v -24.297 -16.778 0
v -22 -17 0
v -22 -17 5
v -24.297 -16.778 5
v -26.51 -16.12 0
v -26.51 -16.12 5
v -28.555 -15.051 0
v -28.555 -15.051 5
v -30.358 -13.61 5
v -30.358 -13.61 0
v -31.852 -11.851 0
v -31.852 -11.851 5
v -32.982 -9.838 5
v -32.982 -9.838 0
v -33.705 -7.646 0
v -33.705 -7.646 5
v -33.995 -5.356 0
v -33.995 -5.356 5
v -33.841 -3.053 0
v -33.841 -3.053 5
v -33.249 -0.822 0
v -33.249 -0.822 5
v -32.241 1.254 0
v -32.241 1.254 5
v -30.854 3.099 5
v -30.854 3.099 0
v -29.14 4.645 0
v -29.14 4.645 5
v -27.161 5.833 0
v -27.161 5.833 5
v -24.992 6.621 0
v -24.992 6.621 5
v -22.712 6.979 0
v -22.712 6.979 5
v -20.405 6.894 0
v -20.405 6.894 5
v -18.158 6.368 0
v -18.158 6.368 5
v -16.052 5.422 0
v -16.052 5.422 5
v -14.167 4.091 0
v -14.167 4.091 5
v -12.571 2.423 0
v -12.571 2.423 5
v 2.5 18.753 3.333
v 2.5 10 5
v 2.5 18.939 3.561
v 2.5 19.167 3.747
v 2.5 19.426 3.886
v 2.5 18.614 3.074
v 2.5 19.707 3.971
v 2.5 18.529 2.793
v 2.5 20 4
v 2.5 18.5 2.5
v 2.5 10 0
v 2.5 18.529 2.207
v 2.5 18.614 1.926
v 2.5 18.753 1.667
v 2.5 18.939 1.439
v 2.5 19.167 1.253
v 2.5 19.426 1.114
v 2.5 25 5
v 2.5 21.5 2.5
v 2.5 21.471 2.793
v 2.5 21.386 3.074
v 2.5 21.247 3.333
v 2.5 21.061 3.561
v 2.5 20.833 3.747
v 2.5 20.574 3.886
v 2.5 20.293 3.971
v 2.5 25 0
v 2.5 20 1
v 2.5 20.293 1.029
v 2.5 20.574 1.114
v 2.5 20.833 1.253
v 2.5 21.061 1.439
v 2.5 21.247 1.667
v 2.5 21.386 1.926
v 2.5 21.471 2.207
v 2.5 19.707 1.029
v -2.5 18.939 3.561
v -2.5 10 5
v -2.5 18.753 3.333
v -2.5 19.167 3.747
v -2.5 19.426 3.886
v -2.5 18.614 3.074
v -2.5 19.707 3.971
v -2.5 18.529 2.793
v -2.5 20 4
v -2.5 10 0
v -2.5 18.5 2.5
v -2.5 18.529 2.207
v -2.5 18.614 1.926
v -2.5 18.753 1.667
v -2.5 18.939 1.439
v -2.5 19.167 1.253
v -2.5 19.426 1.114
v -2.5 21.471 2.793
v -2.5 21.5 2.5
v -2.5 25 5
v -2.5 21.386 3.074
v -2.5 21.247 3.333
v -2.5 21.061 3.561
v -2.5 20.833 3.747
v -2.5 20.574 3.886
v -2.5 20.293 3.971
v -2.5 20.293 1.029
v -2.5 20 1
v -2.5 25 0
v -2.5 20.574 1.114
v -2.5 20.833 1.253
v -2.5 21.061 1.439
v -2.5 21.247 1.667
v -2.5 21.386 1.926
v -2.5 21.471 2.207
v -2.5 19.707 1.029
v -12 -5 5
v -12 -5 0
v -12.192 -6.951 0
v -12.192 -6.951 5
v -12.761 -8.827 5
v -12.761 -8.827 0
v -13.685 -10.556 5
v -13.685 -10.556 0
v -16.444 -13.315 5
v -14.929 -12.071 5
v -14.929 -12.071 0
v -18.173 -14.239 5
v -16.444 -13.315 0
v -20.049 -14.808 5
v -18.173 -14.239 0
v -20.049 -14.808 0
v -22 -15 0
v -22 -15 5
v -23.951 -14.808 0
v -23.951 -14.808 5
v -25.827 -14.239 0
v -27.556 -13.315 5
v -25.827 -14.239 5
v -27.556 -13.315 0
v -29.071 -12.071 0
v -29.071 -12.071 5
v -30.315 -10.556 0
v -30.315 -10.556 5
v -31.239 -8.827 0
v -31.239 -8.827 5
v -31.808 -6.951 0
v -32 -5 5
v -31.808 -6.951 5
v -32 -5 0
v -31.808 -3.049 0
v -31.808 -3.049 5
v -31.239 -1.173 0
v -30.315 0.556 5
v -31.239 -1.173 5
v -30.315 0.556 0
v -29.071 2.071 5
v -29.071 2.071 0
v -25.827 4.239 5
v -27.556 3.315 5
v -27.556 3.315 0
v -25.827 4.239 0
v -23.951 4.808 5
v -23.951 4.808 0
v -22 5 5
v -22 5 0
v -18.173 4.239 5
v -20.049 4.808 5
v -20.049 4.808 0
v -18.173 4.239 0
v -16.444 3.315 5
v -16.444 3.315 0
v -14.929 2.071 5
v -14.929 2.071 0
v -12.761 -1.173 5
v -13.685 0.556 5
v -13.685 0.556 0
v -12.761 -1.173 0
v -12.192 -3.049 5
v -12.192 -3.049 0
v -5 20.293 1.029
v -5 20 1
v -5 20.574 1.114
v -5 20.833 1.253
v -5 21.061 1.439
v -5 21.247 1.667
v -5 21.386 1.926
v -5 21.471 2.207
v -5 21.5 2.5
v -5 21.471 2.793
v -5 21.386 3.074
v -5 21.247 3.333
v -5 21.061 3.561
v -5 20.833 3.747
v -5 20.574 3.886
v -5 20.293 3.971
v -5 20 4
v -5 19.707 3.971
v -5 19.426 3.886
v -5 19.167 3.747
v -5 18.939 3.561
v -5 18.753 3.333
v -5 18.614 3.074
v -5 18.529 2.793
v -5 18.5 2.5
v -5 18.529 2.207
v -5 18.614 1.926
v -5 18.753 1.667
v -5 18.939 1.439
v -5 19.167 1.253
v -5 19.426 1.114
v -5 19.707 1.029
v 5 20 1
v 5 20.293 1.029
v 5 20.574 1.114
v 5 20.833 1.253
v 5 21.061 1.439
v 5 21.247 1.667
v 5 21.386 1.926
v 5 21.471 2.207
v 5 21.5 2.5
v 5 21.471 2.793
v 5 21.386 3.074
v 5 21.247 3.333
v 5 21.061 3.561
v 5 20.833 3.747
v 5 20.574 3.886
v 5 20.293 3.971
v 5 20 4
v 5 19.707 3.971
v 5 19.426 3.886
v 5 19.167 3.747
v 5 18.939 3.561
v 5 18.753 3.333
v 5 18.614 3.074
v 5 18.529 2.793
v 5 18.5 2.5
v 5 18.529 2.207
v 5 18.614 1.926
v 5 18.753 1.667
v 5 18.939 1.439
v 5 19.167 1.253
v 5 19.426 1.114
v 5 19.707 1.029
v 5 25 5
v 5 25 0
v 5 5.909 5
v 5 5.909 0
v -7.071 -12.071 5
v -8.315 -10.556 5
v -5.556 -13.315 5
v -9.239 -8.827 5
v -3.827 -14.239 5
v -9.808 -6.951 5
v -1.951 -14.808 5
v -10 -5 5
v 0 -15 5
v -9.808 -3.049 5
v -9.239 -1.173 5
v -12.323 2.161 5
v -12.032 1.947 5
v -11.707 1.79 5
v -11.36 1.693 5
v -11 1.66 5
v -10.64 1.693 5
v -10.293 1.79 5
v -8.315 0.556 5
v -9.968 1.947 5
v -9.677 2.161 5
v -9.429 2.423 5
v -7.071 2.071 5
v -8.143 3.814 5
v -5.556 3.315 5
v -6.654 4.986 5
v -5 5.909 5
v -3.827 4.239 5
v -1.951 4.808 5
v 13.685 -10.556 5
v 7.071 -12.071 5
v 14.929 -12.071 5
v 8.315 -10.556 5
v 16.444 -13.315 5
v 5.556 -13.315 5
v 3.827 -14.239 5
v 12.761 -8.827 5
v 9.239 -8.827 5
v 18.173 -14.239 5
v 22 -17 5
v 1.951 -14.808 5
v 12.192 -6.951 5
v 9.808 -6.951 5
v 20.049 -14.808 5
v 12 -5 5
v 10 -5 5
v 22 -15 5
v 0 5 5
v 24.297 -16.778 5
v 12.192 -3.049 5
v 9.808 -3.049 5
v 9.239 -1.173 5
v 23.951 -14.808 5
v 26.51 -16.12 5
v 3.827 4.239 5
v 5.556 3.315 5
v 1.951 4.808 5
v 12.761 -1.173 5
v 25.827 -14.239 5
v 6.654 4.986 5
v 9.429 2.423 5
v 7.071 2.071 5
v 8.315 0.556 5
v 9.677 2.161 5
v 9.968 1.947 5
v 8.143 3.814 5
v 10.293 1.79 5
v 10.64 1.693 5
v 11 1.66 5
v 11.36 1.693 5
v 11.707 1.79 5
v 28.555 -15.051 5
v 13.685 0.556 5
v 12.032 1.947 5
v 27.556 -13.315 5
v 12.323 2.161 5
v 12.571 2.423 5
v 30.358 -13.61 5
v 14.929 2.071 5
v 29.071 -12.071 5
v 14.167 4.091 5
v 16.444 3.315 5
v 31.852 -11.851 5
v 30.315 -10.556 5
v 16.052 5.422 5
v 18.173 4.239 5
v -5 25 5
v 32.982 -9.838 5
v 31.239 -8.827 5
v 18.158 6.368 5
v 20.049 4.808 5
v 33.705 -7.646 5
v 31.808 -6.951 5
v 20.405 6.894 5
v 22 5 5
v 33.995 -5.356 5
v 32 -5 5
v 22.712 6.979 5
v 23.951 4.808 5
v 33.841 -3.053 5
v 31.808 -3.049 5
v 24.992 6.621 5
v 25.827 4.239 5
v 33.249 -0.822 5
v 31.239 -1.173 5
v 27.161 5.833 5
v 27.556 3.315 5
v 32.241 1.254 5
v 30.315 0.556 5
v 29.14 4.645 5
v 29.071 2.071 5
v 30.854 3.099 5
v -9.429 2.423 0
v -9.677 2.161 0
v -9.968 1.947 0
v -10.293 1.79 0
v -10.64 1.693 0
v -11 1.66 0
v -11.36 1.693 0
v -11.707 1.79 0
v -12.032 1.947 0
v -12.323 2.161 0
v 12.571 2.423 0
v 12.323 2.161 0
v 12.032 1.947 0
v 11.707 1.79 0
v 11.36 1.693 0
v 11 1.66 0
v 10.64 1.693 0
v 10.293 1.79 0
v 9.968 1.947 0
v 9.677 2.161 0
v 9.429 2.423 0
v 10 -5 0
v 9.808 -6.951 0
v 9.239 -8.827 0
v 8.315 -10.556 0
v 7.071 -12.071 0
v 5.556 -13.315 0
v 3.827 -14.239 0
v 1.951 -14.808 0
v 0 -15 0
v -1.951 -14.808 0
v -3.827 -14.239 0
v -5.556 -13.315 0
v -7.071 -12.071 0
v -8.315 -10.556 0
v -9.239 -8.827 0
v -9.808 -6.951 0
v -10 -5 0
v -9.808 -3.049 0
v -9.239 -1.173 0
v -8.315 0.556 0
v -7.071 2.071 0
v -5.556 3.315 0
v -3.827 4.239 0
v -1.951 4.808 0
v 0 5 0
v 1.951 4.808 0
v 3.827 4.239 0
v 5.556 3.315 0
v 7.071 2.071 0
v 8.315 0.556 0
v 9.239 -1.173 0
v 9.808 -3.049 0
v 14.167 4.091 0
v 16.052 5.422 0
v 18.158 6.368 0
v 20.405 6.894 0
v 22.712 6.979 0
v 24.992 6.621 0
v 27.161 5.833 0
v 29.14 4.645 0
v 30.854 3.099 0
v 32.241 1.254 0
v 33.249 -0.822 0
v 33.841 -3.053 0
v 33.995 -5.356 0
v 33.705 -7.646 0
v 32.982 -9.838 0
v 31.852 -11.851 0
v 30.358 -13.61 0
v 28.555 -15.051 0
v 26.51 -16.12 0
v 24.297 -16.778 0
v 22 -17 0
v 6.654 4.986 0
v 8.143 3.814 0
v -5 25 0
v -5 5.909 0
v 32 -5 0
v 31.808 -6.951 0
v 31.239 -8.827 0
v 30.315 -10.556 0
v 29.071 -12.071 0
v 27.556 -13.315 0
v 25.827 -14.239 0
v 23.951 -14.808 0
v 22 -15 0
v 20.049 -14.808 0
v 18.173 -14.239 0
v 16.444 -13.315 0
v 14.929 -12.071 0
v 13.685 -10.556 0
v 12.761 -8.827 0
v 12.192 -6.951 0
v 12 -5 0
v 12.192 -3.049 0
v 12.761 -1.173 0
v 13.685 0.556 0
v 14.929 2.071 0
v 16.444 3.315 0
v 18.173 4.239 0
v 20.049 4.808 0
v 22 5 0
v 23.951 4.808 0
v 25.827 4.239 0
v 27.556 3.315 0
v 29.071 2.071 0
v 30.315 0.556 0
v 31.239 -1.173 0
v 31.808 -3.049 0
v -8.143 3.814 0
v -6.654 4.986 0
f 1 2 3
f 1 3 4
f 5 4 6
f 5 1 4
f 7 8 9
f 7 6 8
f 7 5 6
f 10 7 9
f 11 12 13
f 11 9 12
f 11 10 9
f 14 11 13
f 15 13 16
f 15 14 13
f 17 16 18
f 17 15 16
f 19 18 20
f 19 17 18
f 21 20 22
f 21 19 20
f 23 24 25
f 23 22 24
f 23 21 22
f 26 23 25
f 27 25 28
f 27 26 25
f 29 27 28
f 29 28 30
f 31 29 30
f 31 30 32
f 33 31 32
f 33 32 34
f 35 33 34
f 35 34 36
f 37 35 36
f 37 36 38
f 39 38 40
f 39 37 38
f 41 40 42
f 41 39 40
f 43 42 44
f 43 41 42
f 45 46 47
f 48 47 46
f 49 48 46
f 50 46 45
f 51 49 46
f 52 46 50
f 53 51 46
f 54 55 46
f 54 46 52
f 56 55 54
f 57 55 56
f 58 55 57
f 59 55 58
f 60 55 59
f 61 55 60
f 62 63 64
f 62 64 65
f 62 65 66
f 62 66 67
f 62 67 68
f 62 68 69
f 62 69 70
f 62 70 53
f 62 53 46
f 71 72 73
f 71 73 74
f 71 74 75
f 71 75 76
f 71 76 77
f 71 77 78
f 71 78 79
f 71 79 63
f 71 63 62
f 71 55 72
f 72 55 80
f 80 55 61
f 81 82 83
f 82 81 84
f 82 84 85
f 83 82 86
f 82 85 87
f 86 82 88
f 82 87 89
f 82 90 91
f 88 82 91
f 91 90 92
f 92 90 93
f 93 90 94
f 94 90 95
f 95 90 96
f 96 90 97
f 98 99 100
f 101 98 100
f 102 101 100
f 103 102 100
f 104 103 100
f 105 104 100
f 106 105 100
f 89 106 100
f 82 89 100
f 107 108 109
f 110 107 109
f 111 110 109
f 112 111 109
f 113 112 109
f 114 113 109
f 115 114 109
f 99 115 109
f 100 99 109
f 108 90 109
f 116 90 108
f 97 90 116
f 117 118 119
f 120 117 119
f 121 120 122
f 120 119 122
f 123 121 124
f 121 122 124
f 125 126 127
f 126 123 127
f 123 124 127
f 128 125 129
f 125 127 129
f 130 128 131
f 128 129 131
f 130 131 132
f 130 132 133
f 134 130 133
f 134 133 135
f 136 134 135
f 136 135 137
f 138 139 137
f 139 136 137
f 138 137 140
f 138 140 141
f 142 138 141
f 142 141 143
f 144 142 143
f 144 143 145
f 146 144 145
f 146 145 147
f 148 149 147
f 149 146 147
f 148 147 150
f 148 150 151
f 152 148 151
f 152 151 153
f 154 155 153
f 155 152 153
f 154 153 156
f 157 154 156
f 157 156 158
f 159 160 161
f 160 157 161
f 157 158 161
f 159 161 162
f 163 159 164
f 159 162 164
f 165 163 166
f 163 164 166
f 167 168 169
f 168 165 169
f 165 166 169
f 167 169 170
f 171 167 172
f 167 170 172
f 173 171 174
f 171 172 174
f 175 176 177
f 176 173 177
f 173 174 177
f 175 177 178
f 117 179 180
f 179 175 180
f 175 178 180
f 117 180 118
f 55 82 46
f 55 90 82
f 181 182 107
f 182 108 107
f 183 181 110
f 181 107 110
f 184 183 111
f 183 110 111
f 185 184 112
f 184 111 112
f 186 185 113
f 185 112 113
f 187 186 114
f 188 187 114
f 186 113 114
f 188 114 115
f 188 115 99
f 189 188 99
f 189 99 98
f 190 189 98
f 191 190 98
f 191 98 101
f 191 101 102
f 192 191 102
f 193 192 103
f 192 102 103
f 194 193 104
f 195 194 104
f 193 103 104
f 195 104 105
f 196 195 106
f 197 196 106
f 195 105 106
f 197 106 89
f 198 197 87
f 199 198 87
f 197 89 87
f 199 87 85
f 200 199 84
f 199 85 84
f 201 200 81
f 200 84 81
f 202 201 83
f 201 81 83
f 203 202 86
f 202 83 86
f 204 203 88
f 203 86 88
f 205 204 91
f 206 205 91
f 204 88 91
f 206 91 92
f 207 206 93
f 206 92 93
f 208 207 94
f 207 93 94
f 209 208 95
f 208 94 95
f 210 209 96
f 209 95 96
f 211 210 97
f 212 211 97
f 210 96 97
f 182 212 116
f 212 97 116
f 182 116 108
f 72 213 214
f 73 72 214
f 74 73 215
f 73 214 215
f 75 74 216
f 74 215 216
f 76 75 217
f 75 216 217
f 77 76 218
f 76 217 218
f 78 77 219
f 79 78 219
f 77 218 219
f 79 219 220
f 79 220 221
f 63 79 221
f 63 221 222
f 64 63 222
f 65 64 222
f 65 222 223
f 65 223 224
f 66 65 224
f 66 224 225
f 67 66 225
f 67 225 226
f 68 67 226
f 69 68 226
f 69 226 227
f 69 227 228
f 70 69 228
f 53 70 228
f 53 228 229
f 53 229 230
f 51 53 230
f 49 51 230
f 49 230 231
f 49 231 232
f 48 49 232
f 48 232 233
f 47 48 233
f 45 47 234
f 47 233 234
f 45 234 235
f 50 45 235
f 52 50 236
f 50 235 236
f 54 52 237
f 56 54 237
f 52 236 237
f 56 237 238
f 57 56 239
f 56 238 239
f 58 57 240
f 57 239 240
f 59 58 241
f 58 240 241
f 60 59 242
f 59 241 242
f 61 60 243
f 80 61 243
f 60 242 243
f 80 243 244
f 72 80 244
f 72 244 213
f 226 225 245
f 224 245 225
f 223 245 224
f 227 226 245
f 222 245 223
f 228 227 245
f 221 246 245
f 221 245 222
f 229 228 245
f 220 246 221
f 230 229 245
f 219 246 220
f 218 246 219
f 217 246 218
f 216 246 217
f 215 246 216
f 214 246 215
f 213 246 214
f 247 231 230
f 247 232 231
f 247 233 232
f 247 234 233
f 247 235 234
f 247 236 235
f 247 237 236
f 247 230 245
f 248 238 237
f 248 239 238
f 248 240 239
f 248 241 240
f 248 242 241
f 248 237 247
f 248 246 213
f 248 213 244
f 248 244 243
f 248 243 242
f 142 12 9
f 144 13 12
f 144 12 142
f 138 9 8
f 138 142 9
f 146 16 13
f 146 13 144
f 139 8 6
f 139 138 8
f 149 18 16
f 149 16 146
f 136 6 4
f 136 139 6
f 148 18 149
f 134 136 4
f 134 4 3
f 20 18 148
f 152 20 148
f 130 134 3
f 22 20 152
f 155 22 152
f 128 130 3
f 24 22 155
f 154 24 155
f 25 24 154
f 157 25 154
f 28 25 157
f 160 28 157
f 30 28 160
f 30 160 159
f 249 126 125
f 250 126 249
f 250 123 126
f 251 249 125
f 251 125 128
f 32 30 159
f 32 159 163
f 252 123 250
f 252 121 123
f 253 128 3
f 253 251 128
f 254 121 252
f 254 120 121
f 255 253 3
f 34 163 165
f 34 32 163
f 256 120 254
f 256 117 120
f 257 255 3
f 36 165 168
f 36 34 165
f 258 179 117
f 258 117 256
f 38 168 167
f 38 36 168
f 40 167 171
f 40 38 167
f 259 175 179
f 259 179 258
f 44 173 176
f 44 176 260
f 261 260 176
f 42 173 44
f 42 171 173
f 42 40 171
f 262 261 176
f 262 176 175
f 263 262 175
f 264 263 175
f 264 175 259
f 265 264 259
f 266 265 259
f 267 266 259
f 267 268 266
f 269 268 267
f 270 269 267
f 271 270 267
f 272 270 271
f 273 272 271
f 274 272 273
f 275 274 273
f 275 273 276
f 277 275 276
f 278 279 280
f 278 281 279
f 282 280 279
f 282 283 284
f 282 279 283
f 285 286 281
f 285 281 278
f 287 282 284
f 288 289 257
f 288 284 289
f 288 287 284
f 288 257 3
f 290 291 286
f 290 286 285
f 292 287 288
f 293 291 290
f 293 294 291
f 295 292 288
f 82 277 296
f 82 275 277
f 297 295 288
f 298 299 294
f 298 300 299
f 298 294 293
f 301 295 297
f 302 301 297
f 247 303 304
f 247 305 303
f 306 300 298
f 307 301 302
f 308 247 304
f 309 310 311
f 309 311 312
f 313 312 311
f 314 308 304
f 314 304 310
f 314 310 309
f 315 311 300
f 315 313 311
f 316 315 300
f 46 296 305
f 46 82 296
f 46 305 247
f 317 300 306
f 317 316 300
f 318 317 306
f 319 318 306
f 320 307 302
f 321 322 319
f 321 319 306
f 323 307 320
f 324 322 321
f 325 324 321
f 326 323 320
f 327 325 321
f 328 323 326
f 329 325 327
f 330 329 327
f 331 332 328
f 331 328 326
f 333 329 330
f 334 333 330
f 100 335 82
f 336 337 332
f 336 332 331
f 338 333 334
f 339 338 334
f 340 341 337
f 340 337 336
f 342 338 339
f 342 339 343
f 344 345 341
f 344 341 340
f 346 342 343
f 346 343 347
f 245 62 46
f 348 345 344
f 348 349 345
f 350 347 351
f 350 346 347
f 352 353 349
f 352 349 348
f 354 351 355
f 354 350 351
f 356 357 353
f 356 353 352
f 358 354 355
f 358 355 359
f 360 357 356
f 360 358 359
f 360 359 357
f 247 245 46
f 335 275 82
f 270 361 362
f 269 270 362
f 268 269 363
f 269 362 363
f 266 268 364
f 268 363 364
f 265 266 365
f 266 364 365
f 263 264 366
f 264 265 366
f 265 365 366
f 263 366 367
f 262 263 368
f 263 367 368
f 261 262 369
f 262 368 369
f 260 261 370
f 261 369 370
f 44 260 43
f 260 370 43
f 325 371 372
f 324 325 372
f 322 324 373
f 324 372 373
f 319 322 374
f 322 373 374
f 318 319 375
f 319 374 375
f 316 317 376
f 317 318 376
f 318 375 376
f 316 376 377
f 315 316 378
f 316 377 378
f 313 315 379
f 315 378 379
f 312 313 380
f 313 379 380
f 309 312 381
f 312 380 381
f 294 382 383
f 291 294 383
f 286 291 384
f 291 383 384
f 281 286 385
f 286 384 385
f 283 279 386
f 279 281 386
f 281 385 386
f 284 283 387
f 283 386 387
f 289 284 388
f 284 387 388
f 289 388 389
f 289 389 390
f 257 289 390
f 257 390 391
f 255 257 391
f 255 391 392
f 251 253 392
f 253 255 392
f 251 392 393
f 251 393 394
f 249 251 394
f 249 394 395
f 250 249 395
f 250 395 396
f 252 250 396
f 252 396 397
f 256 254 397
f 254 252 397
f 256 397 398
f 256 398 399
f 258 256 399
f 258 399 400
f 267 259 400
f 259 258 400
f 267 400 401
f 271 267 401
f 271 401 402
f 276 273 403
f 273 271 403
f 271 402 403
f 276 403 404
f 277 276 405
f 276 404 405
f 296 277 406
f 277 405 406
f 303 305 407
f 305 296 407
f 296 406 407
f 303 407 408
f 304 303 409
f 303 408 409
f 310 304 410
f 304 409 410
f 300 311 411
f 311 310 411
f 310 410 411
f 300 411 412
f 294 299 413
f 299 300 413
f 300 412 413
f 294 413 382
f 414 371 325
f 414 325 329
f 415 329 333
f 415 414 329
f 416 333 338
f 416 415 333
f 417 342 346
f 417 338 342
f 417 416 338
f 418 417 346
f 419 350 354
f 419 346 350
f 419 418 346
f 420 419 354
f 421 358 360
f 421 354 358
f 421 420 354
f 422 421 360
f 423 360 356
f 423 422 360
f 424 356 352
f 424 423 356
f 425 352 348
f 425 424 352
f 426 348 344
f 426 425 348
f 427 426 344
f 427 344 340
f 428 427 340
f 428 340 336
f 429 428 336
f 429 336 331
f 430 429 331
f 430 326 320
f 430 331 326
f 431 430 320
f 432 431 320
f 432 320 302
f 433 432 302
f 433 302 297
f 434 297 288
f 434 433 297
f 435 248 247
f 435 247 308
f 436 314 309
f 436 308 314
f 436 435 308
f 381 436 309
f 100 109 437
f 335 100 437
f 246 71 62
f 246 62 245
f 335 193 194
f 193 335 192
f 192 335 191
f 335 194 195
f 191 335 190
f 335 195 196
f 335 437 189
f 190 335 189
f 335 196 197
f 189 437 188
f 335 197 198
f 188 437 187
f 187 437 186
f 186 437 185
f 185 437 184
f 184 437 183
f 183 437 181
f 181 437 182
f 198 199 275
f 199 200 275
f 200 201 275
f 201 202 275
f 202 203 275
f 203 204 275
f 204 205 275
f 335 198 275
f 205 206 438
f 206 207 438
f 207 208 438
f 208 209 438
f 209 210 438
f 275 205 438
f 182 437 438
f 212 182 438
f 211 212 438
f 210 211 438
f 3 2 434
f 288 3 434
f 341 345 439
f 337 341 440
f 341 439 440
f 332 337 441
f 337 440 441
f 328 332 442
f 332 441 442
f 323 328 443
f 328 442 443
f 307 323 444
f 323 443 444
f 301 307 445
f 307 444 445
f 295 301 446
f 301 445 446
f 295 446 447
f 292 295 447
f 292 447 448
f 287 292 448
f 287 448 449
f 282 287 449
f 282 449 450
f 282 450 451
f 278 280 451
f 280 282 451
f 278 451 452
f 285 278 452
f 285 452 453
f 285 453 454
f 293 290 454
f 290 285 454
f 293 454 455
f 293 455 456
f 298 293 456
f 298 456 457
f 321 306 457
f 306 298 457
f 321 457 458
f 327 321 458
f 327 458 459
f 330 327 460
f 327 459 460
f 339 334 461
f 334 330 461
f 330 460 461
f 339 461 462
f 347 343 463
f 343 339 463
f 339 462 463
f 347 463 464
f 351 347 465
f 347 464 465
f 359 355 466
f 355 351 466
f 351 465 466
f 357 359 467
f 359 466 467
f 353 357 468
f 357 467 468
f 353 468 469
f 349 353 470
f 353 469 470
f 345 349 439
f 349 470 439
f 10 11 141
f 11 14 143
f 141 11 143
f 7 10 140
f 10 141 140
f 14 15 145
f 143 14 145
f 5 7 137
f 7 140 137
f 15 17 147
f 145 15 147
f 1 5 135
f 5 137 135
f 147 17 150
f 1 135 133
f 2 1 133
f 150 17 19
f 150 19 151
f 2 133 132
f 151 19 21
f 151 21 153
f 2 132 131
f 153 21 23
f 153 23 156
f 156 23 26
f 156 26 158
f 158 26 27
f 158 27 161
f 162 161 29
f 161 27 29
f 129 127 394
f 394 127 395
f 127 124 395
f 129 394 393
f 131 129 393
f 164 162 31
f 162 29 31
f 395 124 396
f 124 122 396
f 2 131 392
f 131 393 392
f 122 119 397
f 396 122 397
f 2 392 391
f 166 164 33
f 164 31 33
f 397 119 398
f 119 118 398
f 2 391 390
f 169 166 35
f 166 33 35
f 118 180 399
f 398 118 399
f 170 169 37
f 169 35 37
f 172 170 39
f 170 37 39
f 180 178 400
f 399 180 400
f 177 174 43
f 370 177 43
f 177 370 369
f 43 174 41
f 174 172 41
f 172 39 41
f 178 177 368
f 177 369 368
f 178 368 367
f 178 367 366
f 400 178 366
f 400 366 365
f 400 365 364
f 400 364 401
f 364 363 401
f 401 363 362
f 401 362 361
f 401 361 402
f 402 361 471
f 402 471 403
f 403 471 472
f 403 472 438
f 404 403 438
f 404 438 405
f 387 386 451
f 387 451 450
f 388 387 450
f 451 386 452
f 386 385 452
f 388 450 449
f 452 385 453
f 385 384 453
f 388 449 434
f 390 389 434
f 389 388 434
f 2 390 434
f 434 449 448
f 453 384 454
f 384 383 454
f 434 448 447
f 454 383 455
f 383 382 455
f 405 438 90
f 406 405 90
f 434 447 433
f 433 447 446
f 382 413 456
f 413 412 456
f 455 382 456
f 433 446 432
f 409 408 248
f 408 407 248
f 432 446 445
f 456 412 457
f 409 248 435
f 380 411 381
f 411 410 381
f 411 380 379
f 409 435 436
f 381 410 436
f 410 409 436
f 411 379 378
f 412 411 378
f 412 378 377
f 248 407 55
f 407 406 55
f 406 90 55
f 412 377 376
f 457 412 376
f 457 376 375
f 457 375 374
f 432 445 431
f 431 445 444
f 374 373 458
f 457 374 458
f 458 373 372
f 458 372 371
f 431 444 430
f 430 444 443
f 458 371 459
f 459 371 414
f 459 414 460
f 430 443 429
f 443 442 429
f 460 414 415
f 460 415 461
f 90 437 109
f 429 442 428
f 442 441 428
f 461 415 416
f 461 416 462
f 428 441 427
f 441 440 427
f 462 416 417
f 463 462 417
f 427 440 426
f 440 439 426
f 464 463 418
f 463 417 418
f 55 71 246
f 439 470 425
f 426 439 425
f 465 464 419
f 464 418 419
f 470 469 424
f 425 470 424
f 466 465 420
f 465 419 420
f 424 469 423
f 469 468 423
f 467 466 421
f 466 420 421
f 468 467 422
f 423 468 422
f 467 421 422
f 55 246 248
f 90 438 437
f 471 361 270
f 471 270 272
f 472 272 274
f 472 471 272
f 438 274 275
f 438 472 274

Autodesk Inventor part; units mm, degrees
ref_plane "YZ Plane" through (0, 0, 0) normal (1, 0, 0) x (0, 1, 0)
ref_plane "XZ Plane" through (0, 0, 0) normal (0, 1, 0) x (-1, 0, 0)
ref_plane "XY Plane" through (0, 0, 0) normal (0, 0, 1) x (1, 0, 0)
sketch "Sketch1" plane through (0, 0, 0) normal (0, 0, 1) x (1, 0, 0)
  line L0 (-2.5, 10) -> (-2.5, 20)
  line L1 (2.5, 10) -> (2.5, 25)
  line L2 (2.5, 25) -> (5, 25)
  arc A0 (6.0006, 0.0769) -> (6, -0.0245) centre (14, -0.0245) ccw
  line L3 (-2.5, 10) -> (2.5, 10)
  line L4 (-5, 20) -> (-5, 5.9087)
  line L5 (0, 10) -> (0, 17.0552) construction
  line L6 (5, 25) -> (5, 5.9087)
  circle A1 centre (0, -5) radius 10
  line L7 (0, -5) -> (-38, -5) construction
  arc A2 (-5, 5.9087) -> (-9.4286, 2.4231) centre (0, -5) ccw
  arc A3 (12, -5) -> (22, -15) centre (22, -5) ccw
  arc A4 (9.4286, 2.4231) -> (5, 5.9087) centre (0, -5) ccw
  line L8 (0, -17) -> (22, -17)
  circle A5 centre (-22, -5) radius 10
  arc A6 (-12.5714, 2.4231) -> (-22, -17) centre (-22, -5) ccw
  arc A7 (-12.5714, 2.4231) -> (-9.4286, 2.4231) centre (-11, 3.6603) ccw
  line L9 (-22, -17) -> (0, -17)
  circle A8 centre (22, -5) radius 10
  arc A9 (22, -17) -> (12.5714, 2.4231) centre (22, -5) ccw
  arc A10 (9.4286, 2.4231) -> (12.5714, 2.4231) centre (11, 3.6603) ccw
  line L10 (-2.5, 20) -> (-2.5, 25)
  line L11 (-2.5, 25) -> (-5, 25)
  line L12 (-5, 25) -> (-5, 20)
  point P0 (0, 0)
  point P1 (8, 0)
  point P2 (-32, -5)
  point P3 (-12, -5)
  point P4 (-34, -5)
  point P5 (32, -5)
  point P6 (11, -9.7958)
  point P7 (-5, -15.9087)
  point P8 (38, -5)
  point P9 (32, -5)
  point P10 (34, -5)
  dimension "d12" = 2.5
  dimension "d13" = 10
  dimension "d14" = 2.5
  dimension "d15" = 15
  dimension "d24" = 20
  dimension "d36" = 2
  dimension "d44" = 5
extrude "Extrusion1" add sketch "Sketch1" along normal blind 5
sketch "Sketch3" plane through (0, 0, 5) normal (0, 0, 1) x (1, 0, 0)
  circle A0 centre (0, -5) radius 10
  point P0 (0, 0)
  dimension "d26" = 20
extrude "Extrusion3" cut sketch "Sketch3" against normal blind 5
fillet "Fillet2" [suppressed]
sketch "Sketch4" plane through (5, 5.9087, 0) normal (1, 0, 0) x (0, 0, -1)
  line L0 (0, 19.0913) -> (-5, 19.0913) construction
  line L1 (-2.5, 19.0913) -> (-2.5, 14.0913) construction
  circle A0 centre (-2.5, 14.0913) radius 1.5
  point P0 (0, -5.9087)
  dimension "d30" = 5
  dimension "d31" = 3
extrude "Extrusion4" cut sketch "Sketch4" against normal blind 10
properties part number "beta_dummy"
